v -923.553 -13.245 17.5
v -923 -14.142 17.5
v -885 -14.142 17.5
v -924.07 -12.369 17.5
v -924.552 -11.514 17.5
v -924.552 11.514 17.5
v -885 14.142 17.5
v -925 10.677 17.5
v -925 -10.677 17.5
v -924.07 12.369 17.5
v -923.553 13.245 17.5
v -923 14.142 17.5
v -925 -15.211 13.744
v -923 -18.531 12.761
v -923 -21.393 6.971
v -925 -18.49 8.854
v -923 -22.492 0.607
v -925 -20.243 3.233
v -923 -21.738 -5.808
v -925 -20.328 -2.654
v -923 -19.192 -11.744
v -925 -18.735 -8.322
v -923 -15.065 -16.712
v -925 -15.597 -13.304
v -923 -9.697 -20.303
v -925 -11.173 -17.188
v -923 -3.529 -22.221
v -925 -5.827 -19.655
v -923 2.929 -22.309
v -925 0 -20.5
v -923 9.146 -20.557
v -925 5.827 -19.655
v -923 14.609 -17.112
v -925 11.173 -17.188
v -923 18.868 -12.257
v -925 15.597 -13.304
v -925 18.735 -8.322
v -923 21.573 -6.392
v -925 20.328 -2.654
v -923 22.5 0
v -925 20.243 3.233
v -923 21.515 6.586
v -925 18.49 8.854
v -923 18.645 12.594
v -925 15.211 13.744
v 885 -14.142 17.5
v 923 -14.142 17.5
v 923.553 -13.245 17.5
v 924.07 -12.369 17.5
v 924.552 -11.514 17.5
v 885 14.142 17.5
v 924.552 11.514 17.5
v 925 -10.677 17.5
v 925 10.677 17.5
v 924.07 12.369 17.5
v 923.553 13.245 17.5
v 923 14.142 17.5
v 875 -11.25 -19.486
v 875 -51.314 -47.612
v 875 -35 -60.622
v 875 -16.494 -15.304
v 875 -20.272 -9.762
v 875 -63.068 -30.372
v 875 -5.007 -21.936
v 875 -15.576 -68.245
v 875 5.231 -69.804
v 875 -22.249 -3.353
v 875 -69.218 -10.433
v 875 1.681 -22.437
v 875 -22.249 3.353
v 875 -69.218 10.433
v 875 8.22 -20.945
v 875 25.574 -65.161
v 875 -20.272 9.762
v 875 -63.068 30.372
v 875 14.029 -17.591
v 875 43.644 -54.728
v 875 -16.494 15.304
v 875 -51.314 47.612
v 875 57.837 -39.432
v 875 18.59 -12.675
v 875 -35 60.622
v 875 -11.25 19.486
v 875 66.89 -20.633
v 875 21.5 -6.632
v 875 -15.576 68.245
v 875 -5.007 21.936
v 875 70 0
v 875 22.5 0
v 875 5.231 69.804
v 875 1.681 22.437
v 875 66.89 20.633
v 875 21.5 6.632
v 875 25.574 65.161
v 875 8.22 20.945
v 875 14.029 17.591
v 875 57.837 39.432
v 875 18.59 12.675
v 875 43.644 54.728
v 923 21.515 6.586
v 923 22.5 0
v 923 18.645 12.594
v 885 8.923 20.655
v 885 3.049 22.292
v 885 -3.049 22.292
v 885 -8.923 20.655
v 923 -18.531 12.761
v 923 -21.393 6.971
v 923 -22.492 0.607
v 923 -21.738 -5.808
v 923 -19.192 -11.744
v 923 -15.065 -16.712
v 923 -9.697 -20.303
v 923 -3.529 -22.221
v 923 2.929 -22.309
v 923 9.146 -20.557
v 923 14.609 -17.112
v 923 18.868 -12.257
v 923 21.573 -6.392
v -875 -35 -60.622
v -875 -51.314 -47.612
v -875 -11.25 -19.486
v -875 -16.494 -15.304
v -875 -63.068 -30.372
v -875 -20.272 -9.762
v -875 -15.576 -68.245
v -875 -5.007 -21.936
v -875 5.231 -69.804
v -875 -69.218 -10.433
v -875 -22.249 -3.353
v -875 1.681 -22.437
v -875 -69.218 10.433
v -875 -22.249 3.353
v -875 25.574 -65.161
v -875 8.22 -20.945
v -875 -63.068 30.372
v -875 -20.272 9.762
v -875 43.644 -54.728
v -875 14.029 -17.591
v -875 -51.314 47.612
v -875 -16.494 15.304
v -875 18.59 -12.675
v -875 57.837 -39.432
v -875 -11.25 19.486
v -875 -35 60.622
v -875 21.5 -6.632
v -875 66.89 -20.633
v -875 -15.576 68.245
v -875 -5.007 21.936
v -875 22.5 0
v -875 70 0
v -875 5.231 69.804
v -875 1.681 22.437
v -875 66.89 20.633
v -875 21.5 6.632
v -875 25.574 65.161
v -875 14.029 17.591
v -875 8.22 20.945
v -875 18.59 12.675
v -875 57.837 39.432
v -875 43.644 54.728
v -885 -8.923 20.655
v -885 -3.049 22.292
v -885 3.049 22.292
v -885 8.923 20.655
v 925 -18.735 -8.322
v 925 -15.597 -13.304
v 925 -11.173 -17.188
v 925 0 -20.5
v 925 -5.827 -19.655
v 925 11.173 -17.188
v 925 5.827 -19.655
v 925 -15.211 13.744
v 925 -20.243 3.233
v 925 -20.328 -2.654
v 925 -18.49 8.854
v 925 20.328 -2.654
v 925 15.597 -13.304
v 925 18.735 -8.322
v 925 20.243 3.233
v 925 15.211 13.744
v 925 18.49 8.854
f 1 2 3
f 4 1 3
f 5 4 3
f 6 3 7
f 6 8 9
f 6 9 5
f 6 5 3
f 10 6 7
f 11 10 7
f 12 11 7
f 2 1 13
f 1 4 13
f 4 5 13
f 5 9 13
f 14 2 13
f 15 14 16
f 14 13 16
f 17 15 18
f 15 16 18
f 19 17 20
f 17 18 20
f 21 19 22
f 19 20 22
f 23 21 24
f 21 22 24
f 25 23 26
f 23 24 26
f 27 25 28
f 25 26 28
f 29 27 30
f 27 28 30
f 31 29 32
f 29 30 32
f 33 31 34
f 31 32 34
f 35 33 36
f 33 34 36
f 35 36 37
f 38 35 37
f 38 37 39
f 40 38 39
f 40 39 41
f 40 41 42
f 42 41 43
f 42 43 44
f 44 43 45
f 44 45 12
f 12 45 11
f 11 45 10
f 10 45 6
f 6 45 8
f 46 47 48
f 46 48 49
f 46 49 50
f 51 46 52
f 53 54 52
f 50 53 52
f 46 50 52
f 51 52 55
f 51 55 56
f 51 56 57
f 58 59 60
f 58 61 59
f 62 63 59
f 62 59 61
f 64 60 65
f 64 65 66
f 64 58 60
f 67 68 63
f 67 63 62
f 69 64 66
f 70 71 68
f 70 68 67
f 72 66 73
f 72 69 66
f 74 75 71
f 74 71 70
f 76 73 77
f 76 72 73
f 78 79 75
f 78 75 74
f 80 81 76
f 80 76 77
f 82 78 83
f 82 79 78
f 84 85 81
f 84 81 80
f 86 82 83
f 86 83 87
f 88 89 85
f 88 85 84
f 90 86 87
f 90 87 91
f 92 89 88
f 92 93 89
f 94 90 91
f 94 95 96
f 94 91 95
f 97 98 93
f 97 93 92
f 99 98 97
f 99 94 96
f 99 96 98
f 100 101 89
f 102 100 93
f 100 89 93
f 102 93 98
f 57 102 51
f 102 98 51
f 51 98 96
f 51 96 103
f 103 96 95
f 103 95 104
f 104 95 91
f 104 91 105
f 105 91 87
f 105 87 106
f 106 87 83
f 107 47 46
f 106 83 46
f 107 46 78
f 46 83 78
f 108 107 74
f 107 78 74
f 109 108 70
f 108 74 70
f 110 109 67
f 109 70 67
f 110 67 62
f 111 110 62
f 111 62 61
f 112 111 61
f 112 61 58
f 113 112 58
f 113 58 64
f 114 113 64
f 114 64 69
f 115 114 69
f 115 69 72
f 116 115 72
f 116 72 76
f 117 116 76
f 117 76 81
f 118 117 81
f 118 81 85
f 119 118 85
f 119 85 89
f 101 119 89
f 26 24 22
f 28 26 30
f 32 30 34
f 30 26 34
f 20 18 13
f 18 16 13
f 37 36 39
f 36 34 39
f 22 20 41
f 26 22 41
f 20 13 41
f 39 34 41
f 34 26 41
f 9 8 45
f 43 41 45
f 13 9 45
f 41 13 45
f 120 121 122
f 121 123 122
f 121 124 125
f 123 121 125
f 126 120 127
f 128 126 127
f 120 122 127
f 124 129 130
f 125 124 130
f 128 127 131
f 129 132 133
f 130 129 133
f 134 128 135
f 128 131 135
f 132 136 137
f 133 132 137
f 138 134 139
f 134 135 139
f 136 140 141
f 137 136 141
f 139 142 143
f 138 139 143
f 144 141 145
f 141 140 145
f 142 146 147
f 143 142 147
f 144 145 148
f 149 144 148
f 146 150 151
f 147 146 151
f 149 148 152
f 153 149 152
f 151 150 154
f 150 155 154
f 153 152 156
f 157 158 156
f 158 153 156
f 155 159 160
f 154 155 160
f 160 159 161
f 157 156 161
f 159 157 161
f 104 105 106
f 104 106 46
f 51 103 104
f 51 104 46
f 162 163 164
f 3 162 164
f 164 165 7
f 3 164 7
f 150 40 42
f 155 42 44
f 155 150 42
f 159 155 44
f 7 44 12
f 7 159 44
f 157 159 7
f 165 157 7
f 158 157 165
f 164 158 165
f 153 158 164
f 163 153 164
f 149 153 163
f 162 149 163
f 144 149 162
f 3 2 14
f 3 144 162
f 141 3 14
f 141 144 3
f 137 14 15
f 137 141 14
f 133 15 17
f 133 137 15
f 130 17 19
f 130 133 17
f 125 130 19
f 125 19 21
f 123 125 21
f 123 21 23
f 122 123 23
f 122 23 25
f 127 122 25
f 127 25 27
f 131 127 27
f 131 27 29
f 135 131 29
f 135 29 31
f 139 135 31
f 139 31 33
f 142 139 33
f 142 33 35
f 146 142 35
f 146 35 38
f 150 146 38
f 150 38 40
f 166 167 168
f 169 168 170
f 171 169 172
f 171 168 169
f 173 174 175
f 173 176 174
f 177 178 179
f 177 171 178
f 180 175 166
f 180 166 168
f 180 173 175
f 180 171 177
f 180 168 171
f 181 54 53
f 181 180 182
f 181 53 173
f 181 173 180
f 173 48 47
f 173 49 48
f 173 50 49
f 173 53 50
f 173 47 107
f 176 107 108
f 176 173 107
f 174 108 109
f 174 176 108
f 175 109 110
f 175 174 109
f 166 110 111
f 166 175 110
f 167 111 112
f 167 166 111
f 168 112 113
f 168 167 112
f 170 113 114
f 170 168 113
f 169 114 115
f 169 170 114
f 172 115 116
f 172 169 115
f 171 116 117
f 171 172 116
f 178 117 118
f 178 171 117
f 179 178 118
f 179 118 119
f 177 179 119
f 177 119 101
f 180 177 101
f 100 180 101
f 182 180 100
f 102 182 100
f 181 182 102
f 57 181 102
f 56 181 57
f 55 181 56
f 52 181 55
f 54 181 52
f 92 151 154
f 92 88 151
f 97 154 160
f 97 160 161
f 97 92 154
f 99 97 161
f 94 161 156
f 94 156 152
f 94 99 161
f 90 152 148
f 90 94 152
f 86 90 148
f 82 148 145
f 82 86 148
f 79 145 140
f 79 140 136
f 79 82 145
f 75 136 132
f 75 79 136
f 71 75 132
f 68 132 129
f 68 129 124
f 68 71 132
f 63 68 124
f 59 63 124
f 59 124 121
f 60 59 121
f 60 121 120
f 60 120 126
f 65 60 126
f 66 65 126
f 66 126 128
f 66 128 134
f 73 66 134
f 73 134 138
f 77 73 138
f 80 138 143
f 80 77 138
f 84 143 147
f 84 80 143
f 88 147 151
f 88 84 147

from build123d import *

# Parameters (mm, degrees)
F0_R     = 27.5
F1_DEPTH = 875
F2_R     = 22.5
F3_DEPTH = 50
F5_DEPTH = 40
F6_SIZE  = 2
F8_R     = 70
F9_DEPTH = 875


with BuildPart() as f1:
    # F0 (on Right) → F1 (new body, symmetric)
    with BuildSketch(Plane.YZ):
        Circle(F0_R)
    extrude(amount=F1_DEPTH, both=True)

    # F7: F3 across plane


with BuildPart() as f3:
    # F2 (on face) → F3 (new body)
    with BuildSketch(Plane.YZ.offset(875)):
        Circle(F2_R)
    extrude(amount=F3_DEPTH)

    # F4 (on face) → F5 (cut)
    with BuildSketch(Plane.YZ.offset(925)):
        with BuildLine():
            Line((-14.142136, 17.5), (14.142136, 17.5))
            ThreePointArc((14.142136, 17.5), (0, 22.5), (-14.142136, 17.5))
        make_face()
    extrude(amount=-F5_DEPTH, mode=Mode.SUBTRACT)

    # F6
    f6_edges = [f3.edges().sort_by_distance(p)[0] for p in [
        (925, -9.696699, -20.303301),
    ]]
    chamfer(f6_edges, length=F6_SIZE)


with BuildPart() as f1_1:
    add(f1.part)
    add(f3.part.mirror(Plane.YZ))


    add(f3.part)  # F9 merges F3
    # F8 (on Right) → F9 (join, symmetric)
    with BuildSketch(Plane.YZ):
        Circle(F8_R)
    extrude(amount=F9_DEPTH, both=True)


solid = f1_1.part
